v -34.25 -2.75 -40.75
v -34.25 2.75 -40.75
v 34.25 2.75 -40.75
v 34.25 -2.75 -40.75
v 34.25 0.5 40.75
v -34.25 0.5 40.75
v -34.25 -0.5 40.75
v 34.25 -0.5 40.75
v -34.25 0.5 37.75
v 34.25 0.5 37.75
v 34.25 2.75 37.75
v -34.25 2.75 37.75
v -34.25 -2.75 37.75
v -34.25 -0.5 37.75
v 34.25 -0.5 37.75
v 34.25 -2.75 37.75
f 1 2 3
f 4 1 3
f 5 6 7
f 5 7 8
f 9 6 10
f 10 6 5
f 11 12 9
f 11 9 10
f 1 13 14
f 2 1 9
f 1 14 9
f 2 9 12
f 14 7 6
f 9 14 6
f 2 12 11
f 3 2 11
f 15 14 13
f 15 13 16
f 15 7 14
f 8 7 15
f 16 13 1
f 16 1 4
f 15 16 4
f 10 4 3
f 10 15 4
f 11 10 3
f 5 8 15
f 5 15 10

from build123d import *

# Parameters (mm, degrees)
SKETCH1_W           = 68.5
SKETCH1_H           = 5.5
BOSS_EXTRUDE1_DEPTH = 40.75
SKETCH2_W           = 68.5
SKETCH2_H           = 2.25
CUT_EXTRUDE1_DEPTH  = 3


with BuildPart() as part:
    # Sketch1 → Boss-Extrude1 (new, symmetric)
    with BuildSketch(Plane.XY):
        Rectangle(SKETCH1_W, SKETCH1_H)
    extrude(amount=BOSS_EXTRUDE1_DEPTH, both=True)

    # Sketch2 → Cut-Extrude1 (cut)
    with BuildSketch(Plane.XY.offset(40.75)):
        with Locations((0, 1.625)):
            Rectangle(SKETCH2_W, SKETCH2_H)
        with Locations((0, -1.625)):
            Rectangle(SKETCH2_W, SKETCH2_H)
    extrude(amount=-CUT_EXTRUDE1_DEPTH, mode=Mode.SUBTRACT)


solid = part.part
